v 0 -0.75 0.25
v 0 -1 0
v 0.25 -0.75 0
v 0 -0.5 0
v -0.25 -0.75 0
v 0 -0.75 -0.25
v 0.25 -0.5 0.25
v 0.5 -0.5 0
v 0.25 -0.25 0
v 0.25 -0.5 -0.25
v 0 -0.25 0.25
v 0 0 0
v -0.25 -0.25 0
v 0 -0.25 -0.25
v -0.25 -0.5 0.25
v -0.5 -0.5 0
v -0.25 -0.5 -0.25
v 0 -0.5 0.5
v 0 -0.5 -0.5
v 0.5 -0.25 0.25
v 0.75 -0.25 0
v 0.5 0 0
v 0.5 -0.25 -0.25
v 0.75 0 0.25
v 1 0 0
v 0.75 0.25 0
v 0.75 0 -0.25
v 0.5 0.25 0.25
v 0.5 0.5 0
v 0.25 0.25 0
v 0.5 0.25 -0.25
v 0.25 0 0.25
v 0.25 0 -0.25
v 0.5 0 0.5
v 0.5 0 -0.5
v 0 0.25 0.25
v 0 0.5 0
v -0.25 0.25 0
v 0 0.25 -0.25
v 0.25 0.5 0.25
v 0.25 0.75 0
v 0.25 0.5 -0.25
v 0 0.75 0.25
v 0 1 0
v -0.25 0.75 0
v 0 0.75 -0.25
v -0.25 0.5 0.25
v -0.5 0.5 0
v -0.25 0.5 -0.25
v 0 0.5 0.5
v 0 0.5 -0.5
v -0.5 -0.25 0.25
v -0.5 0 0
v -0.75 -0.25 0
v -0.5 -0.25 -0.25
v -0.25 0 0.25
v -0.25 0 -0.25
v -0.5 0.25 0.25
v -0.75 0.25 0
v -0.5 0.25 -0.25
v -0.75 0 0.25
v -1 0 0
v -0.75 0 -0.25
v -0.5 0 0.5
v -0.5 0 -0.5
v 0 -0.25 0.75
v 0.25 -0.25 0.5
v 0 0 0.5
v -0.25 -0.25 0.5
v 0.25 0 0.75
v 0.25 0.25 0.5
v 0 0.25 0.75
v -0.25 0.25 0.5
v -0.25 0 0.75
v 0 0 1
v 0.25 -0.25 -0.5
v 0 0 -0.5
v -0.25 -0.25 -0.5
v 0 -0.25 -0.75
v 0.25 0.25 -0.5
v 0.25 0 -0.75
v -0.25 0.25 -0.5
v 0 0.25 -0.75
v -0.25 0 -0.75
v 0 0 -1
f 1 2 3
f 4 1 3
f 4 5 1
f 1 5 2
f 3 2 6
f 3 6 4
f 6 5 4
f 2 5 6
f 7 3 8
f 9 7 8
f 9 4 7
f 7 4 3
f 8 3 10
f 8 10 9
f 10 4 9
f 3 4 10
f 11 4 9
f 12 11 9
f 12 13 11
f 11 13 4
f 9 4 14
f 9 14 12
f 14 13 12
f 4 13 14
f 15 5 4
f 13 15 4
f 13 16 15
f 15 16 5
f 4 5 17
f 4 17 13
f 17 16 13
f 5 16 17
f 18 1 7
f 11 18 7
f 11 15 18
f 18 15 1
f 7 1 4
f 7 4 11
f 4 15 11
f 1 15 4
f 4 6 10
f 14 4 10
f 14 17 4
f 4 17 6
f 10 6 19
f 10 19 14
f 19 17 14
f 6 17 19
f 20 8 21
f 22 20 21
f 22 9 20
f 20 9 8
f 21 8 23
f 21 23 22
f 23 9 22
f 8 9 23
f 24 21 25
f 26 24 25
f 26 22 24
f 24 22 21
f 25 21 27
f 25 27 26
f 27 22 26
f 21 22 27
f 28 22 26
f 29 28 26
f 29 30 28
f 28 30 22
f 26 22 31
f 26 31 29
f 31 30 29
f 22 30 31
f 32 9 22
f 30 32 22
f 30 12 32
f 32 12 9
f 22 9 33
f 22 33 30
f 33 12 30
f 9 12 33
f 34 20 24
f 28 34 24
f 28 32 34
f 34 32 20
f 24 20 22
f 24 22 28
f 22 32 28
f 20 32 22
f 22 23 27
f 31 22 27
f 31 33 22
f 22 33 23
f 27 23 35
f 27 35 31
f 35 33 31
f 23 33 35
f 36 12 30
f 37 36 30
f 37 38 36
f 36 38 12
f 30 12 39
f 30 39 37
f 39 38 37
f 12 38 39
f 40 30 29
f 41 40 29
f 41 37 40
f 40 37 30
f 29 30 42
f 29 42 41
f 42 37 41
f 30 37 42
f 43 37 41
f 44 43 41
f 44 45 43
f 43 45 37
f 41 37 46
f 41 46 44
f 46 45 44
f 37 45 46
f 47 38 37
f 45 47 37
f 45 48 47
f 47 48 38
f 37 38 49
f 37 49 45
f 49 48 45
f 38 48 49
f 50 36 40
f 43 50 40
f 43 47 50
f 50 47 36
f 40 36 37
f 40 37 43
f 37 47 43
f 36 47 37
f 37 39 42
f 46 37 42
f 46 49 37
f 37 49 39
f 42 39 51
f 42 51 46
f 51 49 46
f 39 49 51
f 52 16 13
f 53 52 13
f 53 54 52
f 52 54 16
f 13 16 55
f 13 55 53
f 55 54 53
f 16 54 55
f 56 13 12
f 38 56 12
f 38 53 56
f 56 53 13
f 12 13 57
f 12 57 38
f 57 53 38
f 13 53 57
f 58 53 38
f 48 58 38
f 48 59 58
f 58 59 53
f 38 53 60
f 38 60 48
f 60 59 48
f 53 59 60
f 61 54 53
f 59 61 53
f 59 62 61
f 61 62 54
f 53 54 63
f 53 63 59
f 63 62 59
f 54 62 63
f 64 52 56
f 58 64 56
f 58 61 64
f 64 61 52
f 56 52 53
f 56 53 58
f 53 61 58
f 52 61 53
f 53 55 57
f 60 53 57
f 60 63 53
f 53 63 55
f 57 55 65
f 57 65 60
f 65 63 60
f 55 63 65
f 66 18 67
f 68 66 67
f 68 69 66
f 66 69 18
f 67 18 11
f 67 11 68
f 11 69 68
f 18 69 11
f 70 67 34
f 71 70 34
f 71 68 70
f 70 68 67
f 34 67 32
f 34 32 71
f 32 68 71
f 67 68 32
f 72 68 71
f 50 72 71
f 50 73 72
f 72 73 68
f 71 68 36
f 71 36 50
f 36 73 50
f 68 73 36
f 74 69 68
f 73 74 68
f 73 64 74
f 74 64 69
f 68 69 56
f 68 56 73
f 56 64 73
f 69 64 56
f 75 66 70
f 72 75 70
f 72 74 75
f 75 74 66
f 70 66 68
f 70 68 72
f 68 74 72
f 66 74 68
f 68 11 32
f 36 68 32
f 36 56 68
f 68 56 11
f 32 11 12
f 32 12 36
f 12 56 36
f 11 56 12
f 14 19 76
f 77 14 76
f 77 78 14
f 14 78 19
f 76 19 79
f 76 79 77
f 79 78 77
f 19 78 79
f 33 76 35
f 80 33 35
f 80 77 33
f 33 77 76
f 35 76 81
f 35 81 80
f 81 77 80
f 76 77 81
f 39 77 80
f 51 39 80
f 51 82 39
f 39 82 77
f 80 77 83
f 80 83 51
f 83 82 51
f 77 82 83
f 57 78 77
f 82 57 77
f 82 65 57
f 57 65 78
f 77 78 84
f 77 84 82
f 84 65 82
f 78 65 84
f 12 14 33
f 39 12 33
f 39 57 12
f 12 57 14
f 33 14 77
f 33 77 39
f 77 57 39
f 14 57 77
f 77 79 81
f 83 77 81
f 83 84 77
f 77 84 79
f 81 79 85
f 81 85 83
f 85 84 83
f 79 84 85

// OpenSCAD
module octahedron() {
    
     octo_points = [
        [0, -1, 0], // belt
        [ 1, 0, 0], 
        [ 0,  1, 0], 
        [-1,  0, 0], 
        [0, 0, 1], // top
        [0, 0, -1], // bottom
    ];
//
    octo_faces = [
        [0, 1, 4], // top pyramid
        [1, 2, 4],
        [2, 3, 4],
        [3, 0, 4],
        [1, 0, 5], // bottom pyramid
        [2, 1, 5],
        [3, 2, 5],
        [0, 3, 5],
    ];
    


    polyhedron(
        points = octo_points,
        faces = octo_faces
    );
}



module octoflake(i, size, center){
    
    if (i == 0){
        translate(center) scale(size) octahedron();
    } else {
        octoflake(i-1, size/2, center + 1/2 * size * [0, -1, 0]);
        octoflake(i-1, size/2, center + 1/2 * size * [1, 0, 0]);
        octoflake(i-1, size/2, center + 1/2 * size * [0, 1, 0]);
        octoflake(i-1, size/2, center + 1/2 * size * [-1, 0, 0]);
        octoflake(i-1, size/2, center + 1/2 * size * [0, 0, 1]);
        octoflake(i-1, size/2, center + 1/2 * size * [0, 0, -1]);
    }
    
    
}


//octahedron();

octoflake(2, 1, [0,0,0]);
